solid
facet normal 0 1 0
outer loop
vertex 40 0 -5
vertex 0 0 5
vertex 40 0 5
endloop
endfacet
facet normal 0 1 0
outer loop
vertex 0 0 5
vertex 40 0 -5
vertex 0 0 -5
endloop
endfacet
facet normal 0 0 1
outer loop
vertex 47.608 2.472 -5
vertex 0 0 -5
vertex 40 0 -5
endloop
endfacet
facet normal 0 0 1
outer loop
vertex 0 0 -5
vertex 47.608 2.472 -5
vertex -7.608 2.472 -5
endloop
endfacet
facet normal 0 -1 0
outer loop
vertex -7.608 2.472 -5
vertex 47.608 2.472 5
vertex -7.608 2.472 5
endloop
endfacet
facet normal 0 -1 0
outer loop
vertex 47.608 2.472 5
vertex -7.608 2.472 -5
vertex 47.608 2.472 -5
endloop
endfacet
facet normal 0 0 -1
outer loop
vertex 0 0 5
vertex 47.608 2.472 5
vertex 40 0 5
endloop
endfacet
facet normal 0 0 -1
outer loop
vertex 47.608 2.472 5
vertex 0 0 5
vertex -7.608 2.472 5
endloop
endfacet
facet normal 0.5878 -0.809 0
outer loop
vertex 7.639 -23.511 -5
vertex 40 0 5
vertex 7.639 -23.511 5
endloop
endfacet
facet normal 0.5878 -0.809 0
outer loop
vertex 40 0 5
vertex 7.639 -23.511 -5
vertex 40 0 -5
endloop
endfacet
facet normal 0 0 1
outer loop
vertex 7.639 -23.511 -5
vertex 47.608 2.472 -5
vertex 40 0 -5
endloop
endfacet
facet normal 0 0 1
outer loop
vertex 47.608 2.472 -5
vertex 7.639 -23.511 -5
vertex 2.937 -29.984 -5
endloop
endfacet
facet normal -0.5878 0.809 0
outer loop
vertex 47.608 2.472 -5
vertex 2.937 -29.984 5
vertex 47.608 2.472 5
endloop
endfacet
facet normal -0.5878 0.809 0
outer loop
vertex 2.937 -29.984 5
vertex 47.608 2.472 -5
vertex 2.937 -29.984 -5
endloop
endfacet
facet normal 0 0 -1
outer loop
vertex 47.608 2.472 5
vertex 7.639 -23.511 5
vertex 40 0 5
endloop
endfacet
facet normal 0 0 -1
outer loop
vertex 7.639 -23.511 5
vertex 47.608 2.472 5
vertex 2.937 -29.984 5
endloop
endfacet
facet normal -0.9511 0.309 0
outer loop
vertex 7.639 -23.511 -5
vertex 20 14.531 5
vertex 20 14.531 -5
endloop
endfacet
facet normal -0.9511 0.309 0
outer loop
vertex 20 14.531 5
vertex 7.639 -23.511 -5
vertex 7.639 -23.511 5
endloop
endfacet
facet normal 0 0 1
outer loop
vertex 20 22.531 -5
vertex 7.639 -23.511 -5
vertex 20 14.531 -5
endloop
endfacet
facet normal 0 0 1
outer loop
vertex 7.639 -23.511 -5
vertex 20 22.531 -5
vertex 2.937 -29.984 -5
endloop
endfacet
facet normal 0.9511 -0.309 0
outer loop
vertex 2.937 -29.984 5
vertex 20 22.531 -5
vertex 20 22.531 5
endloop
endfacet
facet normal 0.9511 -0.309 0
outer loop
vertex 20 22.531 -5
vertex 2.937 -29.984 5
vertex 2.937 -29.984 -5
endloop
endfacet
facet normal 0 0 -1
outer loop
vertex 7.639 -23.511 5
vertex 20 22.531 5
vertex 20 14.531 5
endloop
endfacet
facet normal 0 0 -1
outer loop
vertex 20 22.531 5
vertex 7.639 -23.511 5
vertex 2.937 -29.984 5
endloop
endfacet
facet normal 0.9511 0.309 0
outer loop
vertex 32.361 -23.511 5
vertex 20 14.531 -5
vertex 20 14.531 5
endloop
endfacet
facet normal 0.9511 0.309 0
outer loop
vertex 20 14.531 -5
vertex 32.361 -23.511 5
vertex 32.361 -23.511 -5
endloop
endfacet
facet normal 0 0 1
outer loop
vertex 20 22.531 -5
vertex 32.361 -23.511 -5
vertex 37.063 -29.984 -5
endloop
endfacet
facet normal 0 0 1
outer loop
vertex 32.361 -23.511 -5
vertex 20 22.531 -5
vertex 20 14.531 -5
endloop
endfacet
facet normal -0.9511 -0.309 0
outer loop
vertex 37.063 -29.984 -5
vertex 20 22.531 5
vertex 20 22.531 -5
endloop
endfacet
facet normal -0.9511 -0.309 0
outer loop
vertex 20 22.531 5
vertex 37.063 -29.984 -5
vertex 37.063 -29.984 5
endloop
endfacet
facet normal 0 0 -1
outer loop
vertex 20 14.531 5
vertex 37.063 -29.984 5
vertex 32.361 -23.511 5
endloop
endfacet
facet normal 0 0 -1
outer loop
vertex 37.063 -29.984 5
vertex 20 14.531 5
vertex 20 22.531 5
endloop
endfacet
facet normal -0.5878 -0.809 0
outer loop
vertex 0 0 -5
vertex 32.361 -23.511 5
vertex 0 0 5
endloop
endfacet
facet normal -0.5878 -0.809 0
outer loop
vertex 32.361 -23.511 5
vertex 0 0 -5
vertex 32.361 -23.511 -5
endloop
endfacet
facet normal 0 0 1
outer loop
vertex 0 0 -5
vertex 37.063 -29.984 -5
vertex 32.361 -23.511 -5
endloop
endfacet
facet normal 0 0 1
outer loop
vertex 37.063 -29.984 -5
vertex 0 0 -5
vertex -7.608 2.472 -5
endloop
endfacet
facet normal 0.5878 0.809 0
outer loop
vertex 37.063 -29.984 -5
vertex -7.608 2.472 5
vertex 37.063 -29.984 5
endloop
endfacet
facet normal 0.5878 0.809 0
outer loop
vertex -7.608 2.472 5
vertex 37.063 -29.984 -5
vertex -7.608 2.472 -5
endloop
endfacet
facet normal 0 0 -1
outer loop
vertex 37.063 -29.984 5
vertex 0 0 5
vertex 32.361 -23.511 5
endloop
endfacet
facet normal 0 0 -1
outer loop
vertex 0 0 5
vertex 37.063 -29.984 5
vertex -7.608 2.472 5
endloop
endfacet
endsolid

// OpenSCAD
/*
   turtle simulation 
   
   Kit Wallace 
   
   Code licensed under the Creative Commons - Attribution - Share Alike license.

  The project is documented in my blog 
   http://kitwallace.tumblr.com/tagged/turtle
  
   using open knot code to render in 3D - vey fast
   
   could vary radius to maintain a constant cross-section 

*/

function m_translate(v) = [ [1, 0, 0, 0],
                            [0, 1, 0, 0],
                            [0, 0, 1, 0],
                            [v.x, v.y, v.z, 1  ] ];
                            
function m_rotate(v) =  [ [1,  0,         0,        0],
                          [0,  cos(v.x),  sin(v.x), 0],
                          [0, -sin(v.x),  cos(v.x), 0],
                          [0,  0,         0,        1] ]
                      * [ [ cos(v.y), 0,  -sin(v.y), 0],
                          [0,         1,  0,        0],
                          [ sin(v.y), 0,  cos(v.y), 0],
                          [0,         0,  0,        1] ]
                      * [ [ cos(v.z),  sin(v.z), 0, 0],
                          [-sin(v.z),  cos(v.z), 0, 0],
                          [ 0,         0,        1, 0],
                          [ 0,         0,        0, 1] ];
                            
function vec3(v) = [v.x, v.y, v.z];
function transform(v, m)  = vec3([v.x, v.y, v.z, 1] * m);

// matrix to orient from centre in direction normal
function m_to(centre,normal) = 
      m_rotate([0, atan2(sqrt(pow(normal.x, 2) + pow(normal.y, 2)), normal.z), 0]) 
    * m_rotate([0, 0, atan2(normal[1], normal[0])]) 
    * m_translate(centre);  

function flatten(l) = [ for (a = l) for (b = a) b ] ;

function ssum(list,i=0) =  
      i < len(list)
        ?  (list[i] + ssum(list,i+1))
        :  0;

function hadamard(a,b) =
       len(a)==len(b)
           ?  [for (i=[0:len(a)-1]) a[i]*b[i]] 
           :  [];   

function scale_3(list,scale) =
   let (mscale = 
        len(scale) == 3 
          ? scale : [scale,scale,scale])
   [for (p=list) hadamard(p,mscale)] ;

// generate points for the profile as an ellipse
// with radius r, eccentricity e 
           
function ellipse_points(r, sides, e=1, theta=0) = 
   [for (i=[0:sides-1]) [r * e * sin(i*360/sides + theta), r *  cos(i*360/sides +theta), 0]];

function rectangle_points(width,height) =
    [ [-width/2,0,0], [width/2,0,0],
      [width/2,height,0], [-width/2,height,0]
    ];
// generate the points along the centre of the tube
function function_points(step,min=0,max=360) = 
   [for (t=[min:step:max]) f(t)];

function path_length(points) =
    ssum([for (i=[0:len(points)-2]) norm(points[i+1] - points[i])]);

// generate all points on the tube surface  
function tube_points(loop_points,profile_points,closed) = 
   closed 
    ?  let (n = len(loop_points)-1 )// ignore last point
       [for (i=[0:n-1])   
        let (n1=loop_points[i + 1] - loop_points[i])
        let (n0=loop_points[i]-loop_points[(i-1+n) % n ])
        let (m = m_to(loop_points[i], (n0+n1)))
        for (p = profile_points) 
           transform(p,m)
       ]
    : concat(
       let (n1=loop_points[1] - loop_points[0])
       let (m = m_to(loop_points[0], n1))
       [for (p = profile_points) 
          transform(p,m)],
       [for (i=[1:len(loop_points)-2])   
       let (n1=loop_points[i + 1] - loop_points[i])
       let (n0=loop_points[i]-loop_points[i-1])
       let (m = m_to(loop_points[i], (n0+n1)))
       for (p = profile_points) 
          
          transform(p,m)
      ] ,
       let (last=len(loop_points) - 1)
       let (n1=loop_points[last] - loop_points[last-1])
       let (m = m_to(loop_points[last], n1))
       [for (p = profile_points) 
          transform(p,m)]
     )
       
;
// generate the faces of the tube surface 
function loop_faces(segs, sides, closed) =  
   closed
       ? 
        let (n = segs-1 )// ignore last point
        [for (i=[0:n])       
           for (j=[0:sides -1])  
            [ i * sides + j, 
              i * sides + (j + 1) % sides, 
             (i + 1) % n  * sides + (j + 1) % sides, 
             (i + 1) % n  * sides + j
             ]
          ]   
       : concat(
         [[for (j=[sides - 1:-1:0])    // one end
              j 
         ]], 
         [for (i=[0:segs-2])           // body
          for (j=[0:sides -1])  
             [ i * sides + j, 
               i * sides + (j + 1) % sides, 
              (i + 1) * sides + (j + 1) % sides, 
              (i + 1) * sides + j
             ]
          ] ,   
          [[for (j=[0:1:sides - 1])   // other end
             (segs-1)*sides  + j]
          ])
     ;
   
// create a knot from a sequnce of path points 
// and cross_section profile points as a polyhedron
module path_knot(loop_points,profile_points,length)  {
    closed =  norm(loop_points[0]- loop_points[len(loop_points)-1])  <0.000000000001 ;
    loop_length = length == undef ? len(loop_points) :length;
    tube_points = tube_points(loop_points,profile_points,closed);
    loop_faces = loop_faces(loop_length,len(profile_points),closed);
    polyhedron(points = tube_points, faces = loop_faces,convexity=20);
}; 

function turtle_path(steps,pos=[0,0,0],dir=0,i=0) =
   i <len(steps)
      ? let(step = steps[i], command=step[0])
        command=="F"
          ? let (distance = step[1])
            let (newpos = pos + distance* [cos(dir), sin(dir),0])
            concat([pos],turtle_path(steps,newpos,dir,i+1)) 
          : command=="L" 
            ?  let (angle = step[1])
               turtle_path(steps,pos,dir+angle,i+1)
            : command=="R"
               ? let (angle = step[1])
                 turtle_path(steps,pos,dir-angle,i+1)
               : turtle_path(steps,pos,dir,i+1)
      : [pos];
 
//  basic poly 
function poly(side,angle,steps) =
   flatten(
    [for (i=[0:steps-1])
     [ ["F",side],["R",angle]]
    ]);

function poly2(side,angle,steps) =
   flatten(
    [for (i=[0:steps-1])
     [ ["F",side],["R",angle],["F",side],["R",2*angle] ]
    ]);

function spi(side,side_inc,angle,steps) =
   steps == 0
      ? []
      : concat( [["F",side]],
                [["L",angle]] ,
                spi(side+side_inc,side_inc,angle,steps-1) 
              ) ; 

function inspi(side,angle,angle_inc,steps) =
   steps == 0
      ? []
      : concat( [["F",side]],
                [["L",angle]] ,
                inspi(side,angle+angle_inc,angle_inc,steps-1) 
              )
    ; 
function inspi2(side,angle,angle_inc,angle_inc_inc=0,steps) =
   steps == 0
      ? []
      : concat( [["F",side]],
                [["L",angle]] ,
                inspi2(side,angle+angle_inc,angle_inc+angle_inc_inc, angle_inc_inc,steps-1) 
              )
    ; 
$fn=30;
    
// steps = poly(20,90,4);    //square    
// steps = poly(10,45,8,4);    // an octagon  
// steps = poly(40,144,5,2);  // a pentagram
// steps = poly(30,135,8);
// steps = poly(20,108,11);
// steps = poly2(5,144,5);
    
// steps = poly2(3,125,40,0.5);
// steps = spi(2,2,60,3,51);     
// steps = inspi(5,0,7,width=1,steps=200); 
// steps = inspi(20,3,3,width=1,steps=180);  //clef

// echo(steps);

// translate([100,100,0]) 
// linear_extrude(height=10) 

// sample turtle graphics

steps = poly(40,144,5);
echo(steps);
path=turtle_path(steps);
echo(path);
perimeter = rectangle_points(width=10,height=8);
echo(perimeter);
echo(path_length(path));
path_knot(path,perimeter);
